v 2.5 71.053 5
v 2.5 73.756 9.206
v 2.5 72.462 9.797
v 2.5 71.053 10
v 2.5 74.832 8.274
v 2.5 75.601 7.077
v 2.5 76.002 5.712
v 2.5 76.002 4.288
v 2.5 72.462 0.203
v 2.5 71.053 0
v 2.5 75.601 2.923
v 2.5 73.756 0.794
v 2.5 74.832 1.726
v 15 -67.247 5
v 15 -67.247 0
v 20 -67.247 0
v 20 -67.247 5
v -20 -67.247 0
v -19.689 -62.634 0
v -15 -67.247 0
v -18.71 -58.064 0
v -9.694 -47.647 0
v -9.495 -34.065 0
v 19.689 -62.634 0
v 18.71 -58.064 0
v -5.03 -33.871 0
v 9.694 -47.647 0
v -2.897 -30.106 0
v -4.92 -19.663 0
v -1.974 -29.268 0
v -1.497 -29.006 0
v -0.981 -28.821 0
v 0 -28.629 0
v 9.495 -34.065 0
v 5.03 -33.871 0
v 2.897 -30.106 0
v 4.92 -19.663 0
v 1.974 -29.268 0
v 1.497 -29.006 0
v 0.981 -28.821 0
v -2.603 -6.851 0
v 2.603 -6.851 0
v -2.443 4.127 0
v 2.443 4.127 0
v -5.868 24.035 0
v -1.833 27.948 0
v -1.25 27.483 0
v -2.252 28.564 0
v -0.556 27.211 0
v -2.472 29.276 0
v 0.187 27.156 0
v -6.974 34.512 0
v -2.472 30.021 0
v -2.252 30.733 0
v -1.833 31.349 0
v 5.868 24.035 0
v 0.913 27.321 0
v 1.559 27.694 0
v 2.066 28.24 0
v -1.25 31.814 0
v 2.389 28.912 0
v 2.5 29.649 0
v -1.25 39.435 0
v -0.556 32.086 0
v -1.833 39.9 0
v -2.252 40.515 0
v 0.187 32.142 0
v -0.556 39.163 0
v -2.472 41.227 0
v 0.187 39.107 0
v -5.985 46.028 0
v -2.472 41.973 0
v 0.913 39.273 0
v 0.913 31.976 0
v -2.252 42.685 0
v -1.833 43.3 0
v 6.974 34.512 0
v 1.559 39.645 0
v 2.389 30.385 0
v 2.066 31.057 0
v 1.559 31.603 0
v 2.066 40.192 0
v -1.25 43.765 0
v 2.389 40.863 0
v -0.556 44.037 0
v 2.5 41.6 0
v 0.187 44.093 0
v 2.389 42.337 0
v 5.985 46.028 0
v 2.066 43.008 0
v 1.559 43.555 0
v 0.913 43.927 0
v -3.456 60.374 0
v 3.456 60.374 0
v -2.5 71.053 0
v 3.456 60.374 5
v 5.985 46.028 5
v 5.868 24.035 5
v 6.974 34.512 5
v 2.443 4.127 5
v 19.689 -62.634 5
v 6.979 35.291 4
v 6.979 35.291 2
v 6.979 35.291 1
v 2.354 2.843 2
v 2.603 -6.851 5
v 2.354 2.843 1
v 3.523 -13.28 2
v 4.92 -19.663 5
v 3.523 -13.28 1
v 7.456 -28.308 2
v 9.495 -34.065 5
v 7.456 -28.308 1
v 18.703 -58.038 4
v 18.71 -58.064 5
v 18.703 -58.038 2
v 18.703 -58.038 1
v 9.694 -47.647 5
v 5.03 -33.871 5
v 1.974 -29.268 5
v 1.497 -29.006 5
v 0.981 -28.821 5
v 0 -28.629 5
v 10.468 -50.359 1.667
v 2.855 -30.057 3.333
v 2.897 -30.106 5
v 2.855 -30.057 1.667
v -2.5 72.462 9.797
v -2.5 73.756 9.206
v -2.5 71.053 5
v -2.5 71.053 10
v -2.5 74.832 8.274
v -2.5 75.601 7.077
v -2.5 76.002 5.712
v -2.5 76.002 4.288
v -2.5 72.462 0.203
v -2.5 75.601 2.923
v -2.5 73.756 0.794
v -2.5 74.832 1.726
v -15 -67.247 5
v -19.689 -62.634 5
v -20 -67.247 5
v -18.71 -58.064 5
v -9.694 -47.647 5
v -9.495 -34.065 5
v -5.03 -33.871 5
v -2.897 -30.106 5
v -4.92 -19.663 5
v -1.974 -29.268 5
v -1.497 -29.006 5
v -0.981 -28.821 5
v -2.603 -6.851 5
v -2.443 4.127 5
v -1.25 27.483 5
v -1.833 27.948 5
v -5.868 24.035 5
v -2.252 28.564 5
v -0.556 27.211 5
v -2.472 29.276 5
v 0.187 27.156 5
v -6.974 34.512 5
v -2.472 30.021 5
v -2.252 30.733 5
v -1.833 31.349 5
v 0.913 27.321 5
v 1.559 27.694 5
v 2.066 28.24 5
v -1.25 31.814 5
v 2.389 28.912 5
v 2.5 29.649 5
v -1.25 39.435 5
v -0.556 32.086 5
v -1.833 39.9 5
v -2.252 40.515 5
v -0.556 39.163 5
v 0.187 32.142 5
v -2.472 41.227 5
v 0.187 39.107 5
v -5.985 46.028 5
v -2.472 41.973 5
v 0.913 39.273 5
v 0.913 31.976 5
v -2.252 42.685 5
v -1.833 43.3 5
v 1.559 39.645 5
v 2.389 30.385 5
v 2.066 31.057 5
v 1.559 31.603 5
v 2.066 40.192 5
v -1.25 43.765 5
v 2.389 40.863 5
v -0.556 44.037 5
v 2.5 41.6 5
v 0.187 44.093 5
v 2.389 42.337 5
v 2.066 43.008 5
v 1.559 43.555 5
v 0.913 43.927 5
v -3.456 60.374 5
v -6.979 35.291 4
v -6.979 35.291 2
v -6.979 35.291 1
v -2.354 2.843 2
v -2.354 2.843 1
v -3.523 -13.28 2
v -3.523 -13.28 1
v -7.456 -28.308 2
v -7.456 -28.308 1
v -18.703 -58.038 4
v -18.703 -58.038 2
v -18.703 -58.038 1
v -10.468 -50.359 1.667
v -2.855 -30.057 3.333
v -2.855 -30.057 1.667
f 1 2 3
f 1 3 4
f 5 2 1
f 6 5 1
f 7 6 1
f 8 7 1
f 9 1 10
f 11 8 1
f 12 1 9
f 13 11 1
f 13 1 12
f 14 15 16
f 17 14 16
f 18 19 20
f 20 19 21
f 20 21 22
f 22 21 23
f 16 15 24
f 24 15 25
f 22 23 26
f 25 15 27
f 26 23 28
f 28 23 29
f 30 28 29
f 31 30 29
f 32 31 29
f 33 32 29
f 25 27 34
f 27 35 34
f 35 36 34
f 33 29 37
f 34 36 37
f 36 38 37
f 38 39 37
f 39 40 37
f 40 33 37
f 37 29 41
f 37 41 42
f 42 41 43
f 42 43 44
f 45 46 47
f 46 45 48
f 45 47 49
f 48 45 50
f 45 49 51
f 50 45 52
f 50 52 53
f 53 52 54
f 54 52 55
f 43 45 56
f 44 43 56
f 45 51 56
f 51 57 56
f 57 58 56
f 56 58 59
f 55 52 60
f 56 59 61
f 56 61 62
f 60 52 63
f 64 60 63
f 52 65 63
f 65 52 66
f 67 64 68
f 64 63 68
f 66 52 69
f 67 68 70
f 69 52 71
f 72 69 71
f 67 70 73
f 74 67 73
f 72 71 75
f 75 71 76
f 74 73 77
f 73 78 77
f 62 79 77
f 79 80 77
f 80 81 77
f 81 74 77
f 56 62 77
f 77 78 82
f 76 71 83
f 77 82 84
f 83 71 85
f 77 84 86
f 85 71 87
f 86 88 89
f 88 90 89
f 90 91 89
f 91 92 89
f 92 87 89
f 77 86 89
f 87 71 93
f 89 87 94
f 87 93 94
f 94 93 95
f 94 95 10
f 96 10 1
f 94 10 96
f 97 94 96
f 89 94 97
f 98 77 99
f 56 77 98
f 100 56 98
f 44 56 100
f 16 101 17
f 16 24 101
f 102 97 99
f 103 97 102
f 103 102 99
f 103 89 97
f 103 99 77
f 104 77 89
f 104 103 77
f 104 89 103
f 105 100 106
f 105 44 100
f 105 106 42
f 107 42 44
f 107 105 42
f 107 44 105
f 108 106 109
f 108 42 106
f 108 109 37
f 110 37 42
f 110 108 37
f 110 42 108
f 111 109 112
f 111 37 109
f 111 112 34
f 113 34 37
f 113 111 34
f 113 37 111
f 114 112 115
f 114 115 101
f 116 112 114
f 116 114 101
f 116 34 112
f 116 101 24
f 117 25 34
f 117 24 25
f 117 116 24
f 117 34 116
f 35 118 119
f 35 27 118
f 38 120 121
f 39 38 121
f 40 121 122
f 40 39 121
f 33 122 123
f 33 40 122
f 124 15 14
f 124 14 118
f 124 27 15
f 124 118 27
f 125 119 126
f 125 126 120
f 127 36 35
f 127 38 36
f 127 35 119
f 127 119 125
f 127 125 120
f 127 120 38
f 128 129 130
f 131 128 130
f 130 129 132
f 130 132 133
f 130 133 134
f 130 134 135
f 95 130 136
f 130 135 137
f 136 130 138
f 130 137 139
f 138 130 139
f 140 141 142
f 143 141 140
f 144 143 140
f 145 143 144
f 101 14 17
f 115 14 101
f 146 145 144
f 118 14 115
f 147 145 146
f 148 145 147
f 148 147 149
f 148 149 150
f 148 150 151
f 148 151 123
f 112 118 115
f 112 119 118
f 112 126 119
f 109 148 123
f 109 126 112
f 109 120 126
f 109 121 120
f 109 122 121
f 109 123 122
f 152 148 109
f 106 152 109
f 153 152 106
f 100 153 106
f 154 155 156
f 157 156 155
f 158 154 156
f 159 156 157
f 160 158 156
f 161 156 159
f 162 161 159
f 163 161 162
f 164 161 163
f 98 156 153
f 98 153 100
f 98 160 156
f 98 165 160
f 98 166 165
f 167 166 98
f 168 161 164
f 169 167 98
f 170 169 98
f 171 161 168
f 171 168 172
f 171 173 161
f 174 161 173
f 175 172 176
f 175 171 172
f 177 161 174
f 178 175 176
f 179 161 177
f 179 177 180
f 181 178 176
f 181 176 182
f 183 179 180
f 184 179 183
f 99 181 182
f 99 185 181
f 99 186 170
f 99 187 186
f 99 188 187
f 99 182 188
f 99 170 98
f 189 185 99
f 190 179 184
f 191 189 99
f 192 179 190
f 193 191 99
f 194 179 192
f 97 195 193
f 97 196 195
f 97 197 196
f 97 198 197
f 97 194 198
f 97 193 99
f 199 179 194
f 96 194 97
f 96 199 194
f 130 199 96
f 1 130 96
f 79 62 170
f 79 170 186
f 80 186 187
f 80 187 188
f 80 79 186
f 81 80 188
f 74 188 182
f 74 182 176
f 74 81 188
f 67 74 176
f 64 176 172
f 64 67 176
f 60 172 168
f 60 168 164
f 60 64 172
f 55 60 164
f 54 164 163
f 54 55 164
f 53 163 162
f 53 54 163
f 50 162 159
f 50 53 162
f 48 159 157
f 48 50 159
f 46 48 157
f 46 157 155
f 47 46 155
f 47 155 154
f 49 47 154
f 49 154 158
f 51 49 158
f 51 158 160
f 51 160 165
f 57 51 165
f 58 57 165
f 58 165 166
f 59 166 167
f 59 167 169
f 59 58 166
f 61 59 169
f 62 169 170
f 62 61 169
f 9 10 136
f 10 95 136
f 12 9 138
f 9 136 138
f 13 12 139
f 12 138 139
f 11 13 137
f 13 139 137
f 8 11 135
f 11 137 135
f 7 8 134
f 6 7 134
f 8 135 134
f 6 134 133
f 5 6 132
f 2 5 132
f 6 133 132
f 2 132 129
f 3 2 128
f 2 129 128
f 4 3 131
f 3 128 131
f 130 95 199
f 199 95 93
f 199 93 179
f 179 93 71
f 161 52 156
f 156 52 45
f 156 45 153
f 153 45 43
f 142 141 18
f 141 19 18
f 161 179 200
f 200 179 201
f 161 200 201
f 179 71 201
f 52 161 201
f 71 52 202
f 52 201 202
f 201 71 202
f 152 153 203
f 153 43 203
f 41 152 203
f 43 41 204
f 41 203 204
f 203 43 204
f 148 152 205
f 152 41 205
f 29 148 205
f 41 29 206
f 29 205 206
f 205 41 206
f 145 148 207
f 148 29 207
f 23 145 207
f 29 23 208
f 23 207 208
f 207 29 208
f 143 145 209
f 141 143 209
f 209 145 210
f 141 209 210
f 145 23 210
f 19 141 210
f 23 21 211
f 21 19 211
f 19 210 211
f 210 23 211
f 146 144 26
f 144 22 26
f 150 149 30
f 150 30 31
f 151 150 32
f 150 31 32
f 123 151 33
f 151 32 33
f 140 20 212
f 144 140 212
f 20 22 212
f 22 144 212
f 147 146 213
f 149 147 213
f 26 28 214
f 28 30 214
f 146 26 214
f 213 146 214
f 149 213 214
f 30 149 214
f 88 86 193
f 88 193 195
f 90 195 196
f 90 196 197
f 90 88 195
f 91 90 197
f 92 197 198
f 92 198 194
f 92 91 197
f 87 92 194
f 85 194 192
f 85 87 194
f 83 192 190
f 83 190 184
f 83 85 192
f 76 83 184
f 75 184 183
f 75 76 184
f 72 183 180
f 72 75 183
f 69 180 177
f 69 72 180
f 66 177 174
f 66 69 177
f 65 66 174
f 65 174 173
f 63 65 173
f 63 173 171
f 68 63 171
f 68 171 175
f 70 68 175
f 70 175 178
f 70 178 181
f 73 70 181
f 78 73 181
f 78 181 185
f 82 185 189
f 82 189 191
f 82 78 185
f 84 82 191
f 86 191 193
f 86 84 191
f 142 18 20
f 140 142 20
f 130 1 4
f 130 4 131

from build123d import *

# Parameters (mm, degrees)
F0_R      = 2.5
F1_DEPTH  = 5
F1_FACE_W = 5
F1_FACE_H = 5
F2_ANGLE  = 180


with BuildPart() as f1:
    # F0 (on Top) → F1 (new body)
    with BuildSketch(Plane.XY):
        with BuildLine():
            Line((2.5, 71.0532781467), (-2.5, 71.0532781467))
            add(Edge.make_bspline(
                [(-2.5, 71.0532781467), (-2.5, 59.2588360598), (-11.2106935248, 35.150238709), (0.9617077508, 3.5175734057), (-6.6090899261, -28.4244456993), (-15.5349249125, -48.3786091549), (-20.1171046806, -61.0484929135), (-20, -67.2467218533)],
                knots=[0, 0, 0, 0, 0.2274557939, 0.4443602309, 0.6572252083, 0.83570549, 1, 1, 1, 1], degree=3))
            Line((-20, -67.2467218533), (-15, -67.2467218533))
            add(Edge.make_bspline(
                [(-15, -67.2467218533), (-13.6951917767, -62.2034367205), (-10.9373851349, -51.5440884827), (-4.3070577646, -29.2885366167), (-0.9350332332, -28.7723029576), (0, -28.6291558295)],
                knots=[0, 0, 0, 0, 0.3935719165, 0.8318427383, 1, 1, 1, 1], degree=3))
            add(Edge.make_bspline(
                [(15, -67.2467218533), (13.6951917767, -62.2034367205), (10.9373851349, -51.5440884827), (4.3070577646, -29.2885366167), (0.9350332332, -28.7723029576), (0, -28.6291558295)],
                knots=[0, 0, 0, 0, 0.3935719165, 0.8318427383, 1, 1, 1, 1], degree=3))
            Line((15, -67.2467218533), (20, -67.2467218533))
            add(Edge.make_bspline(
                [(2.5, 71.0532781467), (2.5, 59.2588360598), (11.2106935248, 35.150238709), (-0.9617077508, 3.5175734057), (6.6090899261, -28.4244456993), (15.5349249125, -48.3786091549), (20.1171046806, -61.0484929135), (20, -67.2467218533)],
                knots=[0, 0, 0, 0, 0.2274557939, 0.4443602309, 0.6572252083, 0.83570549, 1, 1, 1, 1], degree=3))
        make_face()
        with Locations((0, 29.6485398369)):
            Circle(F0_R, mode=Mode.SUBTRACT)
        with Locations((0, 41.6)):
            Circle(F0_R, mode=Mode.SUBTRACT)
    extrude(amount=F1_DEPTH)

    # F1_face (on face) → F2 (revolve)
    with BuildSketch(Plane(origin=(0, 71.0532781467, 2.5), x_dir=(-1, 0, 0), z_dir=(0, 1, 0))):
        Rectangle(F1_FACE_W, F1_FACE_H)
    revolve(axis=Axis((0, 71.0532781467, 5), (1, 0, 0)), revolution_arc=F2_ANGLE)


solid = f1.part
